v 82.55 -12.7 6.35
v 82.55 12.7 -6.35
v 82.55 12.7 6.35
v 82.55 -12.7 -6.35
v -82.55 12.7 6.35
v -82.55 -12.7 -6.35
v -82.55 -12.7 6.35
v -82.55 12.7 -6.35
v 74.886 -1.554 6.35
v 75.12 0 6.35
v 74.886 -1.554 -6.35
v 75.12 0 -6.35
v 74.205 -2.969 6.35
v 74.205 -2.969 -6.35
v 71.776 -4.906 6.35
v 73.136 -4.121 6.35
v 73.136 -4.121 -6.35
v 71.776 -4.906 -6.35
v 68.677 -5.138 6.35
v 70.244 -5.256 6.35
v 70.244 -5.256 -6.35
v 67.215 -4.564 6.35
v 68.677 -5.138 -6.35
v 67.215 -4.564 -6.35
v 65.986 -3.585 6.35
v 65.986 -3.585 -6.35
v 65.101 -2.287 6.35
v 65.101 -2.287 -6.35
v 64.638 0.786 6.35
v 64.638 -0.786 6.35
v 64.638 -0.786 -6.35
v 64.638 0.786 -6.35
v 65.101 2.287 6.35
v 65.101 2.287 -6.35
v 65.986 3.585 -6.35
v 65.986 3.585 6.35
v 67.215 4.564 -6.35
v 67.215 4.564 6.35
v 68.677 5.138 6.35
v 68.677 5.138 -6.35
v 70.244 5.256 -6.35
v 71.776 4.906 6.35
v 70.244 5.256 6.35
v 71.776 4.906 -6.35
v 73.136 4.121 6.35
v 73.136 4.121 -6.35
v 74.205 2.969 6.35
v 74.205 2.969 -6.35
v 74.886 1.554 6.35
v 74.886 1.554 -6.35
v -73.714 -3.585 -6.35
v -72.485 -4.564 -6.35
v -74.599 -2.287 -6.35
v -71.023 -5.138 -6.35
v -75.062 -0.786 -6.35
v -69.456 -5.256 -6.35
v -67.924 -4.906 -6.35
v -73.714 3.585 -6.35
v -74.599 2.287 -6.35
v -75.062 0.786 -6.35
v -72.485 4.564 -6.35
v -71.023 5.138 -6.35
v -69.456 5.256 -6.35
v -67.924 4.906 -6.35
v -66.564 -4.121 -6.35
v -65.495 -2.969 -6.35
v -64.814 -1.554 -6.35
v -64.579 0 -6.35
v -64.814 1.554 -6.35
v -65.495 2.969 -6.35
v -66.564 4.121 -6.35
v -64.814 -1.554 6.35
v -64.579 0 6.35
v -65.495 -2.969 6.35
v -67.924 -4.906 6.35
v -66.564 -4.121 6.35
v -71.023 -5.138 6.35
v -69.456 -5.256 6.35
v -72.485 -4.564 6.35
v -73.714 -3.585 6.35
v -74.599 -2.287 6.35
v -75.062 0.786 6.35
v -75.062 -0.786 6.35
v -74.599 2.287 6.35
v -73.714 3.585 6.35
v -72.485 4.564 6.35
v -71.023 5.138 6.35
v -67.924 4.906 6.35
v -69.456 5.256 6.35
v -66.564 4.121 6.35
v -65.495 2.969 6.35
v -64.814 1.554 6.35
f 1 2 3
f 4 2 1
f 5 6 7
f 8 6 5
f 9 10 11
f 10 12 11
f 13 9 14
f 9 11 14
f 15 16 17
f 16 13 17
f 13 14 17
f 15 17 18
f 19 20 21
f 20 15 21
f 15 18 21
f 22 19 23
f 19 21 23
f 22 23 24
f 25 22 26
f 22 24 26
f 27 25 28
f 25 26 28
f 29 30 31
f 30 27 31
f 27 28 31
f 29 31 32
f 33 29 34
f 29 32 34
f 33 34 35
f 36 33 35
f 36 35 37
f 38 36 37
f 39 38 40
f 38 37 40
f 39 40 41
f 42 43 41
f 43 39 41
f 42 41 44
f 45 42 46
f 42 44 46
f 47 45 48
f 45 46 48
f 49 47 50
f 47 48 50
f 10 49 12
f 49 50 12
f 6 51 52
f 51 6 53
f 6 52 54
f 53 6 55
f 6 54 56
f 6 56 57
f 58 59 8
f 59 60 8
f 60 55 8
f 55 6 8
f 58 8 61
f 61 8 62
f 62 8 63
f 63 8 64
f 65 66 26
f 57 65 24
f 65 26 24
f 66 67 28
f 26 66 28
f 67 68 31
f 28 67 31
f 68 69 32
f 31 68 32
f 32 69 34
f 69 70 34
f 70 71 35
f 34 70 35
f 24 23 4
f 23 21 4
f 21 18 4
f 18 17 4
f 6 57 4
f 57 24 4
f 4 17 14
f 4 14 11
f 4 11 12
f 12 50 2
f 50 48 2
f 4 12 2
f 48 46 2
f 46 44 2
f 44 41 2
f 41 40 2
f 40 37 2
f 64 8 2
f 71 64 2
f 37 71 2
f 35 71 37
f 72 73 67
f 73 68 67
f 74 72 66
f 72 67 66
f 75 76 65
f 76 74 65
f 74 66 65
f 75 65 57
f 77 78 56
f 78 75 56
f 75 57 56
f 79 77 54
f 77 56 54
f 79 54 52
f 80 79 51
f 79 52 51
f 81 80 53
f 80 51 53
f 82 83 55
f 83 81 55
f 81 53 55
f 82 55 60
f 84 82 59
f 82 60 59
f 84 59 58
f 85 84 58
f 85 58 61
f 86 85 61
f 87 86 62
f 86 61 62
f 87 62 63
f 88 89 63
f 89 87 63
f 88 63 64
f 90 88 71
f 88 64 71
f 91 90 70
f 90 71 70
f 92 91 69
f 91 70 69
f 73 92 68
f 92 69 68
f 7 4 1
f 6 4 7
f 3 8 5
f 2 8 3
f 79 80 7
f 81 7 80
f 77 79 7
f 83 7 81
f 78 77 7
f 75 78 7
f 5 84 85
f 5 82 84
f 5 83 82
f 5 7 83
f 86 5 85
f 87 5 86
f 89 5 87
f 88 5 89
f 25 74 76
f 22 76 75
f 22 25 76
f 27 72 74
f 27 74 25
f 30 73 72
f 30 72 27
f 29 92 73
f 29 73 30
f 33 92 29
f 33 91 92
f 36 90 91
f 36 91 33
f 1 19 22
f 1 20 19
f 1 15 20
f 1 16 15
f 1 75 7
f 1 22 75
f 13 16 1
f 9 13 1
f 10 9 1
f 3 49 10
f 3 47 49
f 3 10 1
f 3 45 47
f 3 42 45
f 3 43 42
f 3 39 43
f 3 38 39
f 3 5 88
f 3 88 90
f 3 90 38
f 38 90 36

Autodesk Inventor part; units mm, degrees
ref_plane "YZ Plane" through (0, 0, 0) normal (1, 0, 0) x (0, 1, 0)
ref_plane "XZ Plane" through (0, 0, 0) normal (0, 1, 0) x (-1, 0, 0)
ref_plane "XY Plane" through (0, 0, 0) normal (0, 0, 1) x (1, 0, 0)
sketch "Sketch1" plane through (0, 0, 0) normal (0, 0, 1) x (1, 0, 0)
  line L0 (-82.55, 12.7) -> (82.55, 12.7)
  line L1 (82.55, 12.7) -> (82.55, -12.7)
  line L2 (82.55, -12.7) -> (-82.55, -12.7)
  line L3 (-82.55, -12.7) -> (-82.55, 12.7)
  line L4 (-82.55, 12.7) -> (82.55, -12.7) construction
  line L5 (82.55, 12.7) -> (-82.55, -12.7) construction
  circle A0 centre (-69.85, 0) radius 5.2705
  circle A1 centre (69.85, 0) radius 5.2705
  point P0 (0, 0)
  dimension "d0" = 165.1
  dimension "d1" = 25.4
  dimension "d2" = 10.541
  dimension "d3" = 12.7
  dimension "d5" = 12.7
extrude "Extrusion1" add sketch "Sketch1" along normal mid plane 12.7
properties part number "connectingRod-4-in"
